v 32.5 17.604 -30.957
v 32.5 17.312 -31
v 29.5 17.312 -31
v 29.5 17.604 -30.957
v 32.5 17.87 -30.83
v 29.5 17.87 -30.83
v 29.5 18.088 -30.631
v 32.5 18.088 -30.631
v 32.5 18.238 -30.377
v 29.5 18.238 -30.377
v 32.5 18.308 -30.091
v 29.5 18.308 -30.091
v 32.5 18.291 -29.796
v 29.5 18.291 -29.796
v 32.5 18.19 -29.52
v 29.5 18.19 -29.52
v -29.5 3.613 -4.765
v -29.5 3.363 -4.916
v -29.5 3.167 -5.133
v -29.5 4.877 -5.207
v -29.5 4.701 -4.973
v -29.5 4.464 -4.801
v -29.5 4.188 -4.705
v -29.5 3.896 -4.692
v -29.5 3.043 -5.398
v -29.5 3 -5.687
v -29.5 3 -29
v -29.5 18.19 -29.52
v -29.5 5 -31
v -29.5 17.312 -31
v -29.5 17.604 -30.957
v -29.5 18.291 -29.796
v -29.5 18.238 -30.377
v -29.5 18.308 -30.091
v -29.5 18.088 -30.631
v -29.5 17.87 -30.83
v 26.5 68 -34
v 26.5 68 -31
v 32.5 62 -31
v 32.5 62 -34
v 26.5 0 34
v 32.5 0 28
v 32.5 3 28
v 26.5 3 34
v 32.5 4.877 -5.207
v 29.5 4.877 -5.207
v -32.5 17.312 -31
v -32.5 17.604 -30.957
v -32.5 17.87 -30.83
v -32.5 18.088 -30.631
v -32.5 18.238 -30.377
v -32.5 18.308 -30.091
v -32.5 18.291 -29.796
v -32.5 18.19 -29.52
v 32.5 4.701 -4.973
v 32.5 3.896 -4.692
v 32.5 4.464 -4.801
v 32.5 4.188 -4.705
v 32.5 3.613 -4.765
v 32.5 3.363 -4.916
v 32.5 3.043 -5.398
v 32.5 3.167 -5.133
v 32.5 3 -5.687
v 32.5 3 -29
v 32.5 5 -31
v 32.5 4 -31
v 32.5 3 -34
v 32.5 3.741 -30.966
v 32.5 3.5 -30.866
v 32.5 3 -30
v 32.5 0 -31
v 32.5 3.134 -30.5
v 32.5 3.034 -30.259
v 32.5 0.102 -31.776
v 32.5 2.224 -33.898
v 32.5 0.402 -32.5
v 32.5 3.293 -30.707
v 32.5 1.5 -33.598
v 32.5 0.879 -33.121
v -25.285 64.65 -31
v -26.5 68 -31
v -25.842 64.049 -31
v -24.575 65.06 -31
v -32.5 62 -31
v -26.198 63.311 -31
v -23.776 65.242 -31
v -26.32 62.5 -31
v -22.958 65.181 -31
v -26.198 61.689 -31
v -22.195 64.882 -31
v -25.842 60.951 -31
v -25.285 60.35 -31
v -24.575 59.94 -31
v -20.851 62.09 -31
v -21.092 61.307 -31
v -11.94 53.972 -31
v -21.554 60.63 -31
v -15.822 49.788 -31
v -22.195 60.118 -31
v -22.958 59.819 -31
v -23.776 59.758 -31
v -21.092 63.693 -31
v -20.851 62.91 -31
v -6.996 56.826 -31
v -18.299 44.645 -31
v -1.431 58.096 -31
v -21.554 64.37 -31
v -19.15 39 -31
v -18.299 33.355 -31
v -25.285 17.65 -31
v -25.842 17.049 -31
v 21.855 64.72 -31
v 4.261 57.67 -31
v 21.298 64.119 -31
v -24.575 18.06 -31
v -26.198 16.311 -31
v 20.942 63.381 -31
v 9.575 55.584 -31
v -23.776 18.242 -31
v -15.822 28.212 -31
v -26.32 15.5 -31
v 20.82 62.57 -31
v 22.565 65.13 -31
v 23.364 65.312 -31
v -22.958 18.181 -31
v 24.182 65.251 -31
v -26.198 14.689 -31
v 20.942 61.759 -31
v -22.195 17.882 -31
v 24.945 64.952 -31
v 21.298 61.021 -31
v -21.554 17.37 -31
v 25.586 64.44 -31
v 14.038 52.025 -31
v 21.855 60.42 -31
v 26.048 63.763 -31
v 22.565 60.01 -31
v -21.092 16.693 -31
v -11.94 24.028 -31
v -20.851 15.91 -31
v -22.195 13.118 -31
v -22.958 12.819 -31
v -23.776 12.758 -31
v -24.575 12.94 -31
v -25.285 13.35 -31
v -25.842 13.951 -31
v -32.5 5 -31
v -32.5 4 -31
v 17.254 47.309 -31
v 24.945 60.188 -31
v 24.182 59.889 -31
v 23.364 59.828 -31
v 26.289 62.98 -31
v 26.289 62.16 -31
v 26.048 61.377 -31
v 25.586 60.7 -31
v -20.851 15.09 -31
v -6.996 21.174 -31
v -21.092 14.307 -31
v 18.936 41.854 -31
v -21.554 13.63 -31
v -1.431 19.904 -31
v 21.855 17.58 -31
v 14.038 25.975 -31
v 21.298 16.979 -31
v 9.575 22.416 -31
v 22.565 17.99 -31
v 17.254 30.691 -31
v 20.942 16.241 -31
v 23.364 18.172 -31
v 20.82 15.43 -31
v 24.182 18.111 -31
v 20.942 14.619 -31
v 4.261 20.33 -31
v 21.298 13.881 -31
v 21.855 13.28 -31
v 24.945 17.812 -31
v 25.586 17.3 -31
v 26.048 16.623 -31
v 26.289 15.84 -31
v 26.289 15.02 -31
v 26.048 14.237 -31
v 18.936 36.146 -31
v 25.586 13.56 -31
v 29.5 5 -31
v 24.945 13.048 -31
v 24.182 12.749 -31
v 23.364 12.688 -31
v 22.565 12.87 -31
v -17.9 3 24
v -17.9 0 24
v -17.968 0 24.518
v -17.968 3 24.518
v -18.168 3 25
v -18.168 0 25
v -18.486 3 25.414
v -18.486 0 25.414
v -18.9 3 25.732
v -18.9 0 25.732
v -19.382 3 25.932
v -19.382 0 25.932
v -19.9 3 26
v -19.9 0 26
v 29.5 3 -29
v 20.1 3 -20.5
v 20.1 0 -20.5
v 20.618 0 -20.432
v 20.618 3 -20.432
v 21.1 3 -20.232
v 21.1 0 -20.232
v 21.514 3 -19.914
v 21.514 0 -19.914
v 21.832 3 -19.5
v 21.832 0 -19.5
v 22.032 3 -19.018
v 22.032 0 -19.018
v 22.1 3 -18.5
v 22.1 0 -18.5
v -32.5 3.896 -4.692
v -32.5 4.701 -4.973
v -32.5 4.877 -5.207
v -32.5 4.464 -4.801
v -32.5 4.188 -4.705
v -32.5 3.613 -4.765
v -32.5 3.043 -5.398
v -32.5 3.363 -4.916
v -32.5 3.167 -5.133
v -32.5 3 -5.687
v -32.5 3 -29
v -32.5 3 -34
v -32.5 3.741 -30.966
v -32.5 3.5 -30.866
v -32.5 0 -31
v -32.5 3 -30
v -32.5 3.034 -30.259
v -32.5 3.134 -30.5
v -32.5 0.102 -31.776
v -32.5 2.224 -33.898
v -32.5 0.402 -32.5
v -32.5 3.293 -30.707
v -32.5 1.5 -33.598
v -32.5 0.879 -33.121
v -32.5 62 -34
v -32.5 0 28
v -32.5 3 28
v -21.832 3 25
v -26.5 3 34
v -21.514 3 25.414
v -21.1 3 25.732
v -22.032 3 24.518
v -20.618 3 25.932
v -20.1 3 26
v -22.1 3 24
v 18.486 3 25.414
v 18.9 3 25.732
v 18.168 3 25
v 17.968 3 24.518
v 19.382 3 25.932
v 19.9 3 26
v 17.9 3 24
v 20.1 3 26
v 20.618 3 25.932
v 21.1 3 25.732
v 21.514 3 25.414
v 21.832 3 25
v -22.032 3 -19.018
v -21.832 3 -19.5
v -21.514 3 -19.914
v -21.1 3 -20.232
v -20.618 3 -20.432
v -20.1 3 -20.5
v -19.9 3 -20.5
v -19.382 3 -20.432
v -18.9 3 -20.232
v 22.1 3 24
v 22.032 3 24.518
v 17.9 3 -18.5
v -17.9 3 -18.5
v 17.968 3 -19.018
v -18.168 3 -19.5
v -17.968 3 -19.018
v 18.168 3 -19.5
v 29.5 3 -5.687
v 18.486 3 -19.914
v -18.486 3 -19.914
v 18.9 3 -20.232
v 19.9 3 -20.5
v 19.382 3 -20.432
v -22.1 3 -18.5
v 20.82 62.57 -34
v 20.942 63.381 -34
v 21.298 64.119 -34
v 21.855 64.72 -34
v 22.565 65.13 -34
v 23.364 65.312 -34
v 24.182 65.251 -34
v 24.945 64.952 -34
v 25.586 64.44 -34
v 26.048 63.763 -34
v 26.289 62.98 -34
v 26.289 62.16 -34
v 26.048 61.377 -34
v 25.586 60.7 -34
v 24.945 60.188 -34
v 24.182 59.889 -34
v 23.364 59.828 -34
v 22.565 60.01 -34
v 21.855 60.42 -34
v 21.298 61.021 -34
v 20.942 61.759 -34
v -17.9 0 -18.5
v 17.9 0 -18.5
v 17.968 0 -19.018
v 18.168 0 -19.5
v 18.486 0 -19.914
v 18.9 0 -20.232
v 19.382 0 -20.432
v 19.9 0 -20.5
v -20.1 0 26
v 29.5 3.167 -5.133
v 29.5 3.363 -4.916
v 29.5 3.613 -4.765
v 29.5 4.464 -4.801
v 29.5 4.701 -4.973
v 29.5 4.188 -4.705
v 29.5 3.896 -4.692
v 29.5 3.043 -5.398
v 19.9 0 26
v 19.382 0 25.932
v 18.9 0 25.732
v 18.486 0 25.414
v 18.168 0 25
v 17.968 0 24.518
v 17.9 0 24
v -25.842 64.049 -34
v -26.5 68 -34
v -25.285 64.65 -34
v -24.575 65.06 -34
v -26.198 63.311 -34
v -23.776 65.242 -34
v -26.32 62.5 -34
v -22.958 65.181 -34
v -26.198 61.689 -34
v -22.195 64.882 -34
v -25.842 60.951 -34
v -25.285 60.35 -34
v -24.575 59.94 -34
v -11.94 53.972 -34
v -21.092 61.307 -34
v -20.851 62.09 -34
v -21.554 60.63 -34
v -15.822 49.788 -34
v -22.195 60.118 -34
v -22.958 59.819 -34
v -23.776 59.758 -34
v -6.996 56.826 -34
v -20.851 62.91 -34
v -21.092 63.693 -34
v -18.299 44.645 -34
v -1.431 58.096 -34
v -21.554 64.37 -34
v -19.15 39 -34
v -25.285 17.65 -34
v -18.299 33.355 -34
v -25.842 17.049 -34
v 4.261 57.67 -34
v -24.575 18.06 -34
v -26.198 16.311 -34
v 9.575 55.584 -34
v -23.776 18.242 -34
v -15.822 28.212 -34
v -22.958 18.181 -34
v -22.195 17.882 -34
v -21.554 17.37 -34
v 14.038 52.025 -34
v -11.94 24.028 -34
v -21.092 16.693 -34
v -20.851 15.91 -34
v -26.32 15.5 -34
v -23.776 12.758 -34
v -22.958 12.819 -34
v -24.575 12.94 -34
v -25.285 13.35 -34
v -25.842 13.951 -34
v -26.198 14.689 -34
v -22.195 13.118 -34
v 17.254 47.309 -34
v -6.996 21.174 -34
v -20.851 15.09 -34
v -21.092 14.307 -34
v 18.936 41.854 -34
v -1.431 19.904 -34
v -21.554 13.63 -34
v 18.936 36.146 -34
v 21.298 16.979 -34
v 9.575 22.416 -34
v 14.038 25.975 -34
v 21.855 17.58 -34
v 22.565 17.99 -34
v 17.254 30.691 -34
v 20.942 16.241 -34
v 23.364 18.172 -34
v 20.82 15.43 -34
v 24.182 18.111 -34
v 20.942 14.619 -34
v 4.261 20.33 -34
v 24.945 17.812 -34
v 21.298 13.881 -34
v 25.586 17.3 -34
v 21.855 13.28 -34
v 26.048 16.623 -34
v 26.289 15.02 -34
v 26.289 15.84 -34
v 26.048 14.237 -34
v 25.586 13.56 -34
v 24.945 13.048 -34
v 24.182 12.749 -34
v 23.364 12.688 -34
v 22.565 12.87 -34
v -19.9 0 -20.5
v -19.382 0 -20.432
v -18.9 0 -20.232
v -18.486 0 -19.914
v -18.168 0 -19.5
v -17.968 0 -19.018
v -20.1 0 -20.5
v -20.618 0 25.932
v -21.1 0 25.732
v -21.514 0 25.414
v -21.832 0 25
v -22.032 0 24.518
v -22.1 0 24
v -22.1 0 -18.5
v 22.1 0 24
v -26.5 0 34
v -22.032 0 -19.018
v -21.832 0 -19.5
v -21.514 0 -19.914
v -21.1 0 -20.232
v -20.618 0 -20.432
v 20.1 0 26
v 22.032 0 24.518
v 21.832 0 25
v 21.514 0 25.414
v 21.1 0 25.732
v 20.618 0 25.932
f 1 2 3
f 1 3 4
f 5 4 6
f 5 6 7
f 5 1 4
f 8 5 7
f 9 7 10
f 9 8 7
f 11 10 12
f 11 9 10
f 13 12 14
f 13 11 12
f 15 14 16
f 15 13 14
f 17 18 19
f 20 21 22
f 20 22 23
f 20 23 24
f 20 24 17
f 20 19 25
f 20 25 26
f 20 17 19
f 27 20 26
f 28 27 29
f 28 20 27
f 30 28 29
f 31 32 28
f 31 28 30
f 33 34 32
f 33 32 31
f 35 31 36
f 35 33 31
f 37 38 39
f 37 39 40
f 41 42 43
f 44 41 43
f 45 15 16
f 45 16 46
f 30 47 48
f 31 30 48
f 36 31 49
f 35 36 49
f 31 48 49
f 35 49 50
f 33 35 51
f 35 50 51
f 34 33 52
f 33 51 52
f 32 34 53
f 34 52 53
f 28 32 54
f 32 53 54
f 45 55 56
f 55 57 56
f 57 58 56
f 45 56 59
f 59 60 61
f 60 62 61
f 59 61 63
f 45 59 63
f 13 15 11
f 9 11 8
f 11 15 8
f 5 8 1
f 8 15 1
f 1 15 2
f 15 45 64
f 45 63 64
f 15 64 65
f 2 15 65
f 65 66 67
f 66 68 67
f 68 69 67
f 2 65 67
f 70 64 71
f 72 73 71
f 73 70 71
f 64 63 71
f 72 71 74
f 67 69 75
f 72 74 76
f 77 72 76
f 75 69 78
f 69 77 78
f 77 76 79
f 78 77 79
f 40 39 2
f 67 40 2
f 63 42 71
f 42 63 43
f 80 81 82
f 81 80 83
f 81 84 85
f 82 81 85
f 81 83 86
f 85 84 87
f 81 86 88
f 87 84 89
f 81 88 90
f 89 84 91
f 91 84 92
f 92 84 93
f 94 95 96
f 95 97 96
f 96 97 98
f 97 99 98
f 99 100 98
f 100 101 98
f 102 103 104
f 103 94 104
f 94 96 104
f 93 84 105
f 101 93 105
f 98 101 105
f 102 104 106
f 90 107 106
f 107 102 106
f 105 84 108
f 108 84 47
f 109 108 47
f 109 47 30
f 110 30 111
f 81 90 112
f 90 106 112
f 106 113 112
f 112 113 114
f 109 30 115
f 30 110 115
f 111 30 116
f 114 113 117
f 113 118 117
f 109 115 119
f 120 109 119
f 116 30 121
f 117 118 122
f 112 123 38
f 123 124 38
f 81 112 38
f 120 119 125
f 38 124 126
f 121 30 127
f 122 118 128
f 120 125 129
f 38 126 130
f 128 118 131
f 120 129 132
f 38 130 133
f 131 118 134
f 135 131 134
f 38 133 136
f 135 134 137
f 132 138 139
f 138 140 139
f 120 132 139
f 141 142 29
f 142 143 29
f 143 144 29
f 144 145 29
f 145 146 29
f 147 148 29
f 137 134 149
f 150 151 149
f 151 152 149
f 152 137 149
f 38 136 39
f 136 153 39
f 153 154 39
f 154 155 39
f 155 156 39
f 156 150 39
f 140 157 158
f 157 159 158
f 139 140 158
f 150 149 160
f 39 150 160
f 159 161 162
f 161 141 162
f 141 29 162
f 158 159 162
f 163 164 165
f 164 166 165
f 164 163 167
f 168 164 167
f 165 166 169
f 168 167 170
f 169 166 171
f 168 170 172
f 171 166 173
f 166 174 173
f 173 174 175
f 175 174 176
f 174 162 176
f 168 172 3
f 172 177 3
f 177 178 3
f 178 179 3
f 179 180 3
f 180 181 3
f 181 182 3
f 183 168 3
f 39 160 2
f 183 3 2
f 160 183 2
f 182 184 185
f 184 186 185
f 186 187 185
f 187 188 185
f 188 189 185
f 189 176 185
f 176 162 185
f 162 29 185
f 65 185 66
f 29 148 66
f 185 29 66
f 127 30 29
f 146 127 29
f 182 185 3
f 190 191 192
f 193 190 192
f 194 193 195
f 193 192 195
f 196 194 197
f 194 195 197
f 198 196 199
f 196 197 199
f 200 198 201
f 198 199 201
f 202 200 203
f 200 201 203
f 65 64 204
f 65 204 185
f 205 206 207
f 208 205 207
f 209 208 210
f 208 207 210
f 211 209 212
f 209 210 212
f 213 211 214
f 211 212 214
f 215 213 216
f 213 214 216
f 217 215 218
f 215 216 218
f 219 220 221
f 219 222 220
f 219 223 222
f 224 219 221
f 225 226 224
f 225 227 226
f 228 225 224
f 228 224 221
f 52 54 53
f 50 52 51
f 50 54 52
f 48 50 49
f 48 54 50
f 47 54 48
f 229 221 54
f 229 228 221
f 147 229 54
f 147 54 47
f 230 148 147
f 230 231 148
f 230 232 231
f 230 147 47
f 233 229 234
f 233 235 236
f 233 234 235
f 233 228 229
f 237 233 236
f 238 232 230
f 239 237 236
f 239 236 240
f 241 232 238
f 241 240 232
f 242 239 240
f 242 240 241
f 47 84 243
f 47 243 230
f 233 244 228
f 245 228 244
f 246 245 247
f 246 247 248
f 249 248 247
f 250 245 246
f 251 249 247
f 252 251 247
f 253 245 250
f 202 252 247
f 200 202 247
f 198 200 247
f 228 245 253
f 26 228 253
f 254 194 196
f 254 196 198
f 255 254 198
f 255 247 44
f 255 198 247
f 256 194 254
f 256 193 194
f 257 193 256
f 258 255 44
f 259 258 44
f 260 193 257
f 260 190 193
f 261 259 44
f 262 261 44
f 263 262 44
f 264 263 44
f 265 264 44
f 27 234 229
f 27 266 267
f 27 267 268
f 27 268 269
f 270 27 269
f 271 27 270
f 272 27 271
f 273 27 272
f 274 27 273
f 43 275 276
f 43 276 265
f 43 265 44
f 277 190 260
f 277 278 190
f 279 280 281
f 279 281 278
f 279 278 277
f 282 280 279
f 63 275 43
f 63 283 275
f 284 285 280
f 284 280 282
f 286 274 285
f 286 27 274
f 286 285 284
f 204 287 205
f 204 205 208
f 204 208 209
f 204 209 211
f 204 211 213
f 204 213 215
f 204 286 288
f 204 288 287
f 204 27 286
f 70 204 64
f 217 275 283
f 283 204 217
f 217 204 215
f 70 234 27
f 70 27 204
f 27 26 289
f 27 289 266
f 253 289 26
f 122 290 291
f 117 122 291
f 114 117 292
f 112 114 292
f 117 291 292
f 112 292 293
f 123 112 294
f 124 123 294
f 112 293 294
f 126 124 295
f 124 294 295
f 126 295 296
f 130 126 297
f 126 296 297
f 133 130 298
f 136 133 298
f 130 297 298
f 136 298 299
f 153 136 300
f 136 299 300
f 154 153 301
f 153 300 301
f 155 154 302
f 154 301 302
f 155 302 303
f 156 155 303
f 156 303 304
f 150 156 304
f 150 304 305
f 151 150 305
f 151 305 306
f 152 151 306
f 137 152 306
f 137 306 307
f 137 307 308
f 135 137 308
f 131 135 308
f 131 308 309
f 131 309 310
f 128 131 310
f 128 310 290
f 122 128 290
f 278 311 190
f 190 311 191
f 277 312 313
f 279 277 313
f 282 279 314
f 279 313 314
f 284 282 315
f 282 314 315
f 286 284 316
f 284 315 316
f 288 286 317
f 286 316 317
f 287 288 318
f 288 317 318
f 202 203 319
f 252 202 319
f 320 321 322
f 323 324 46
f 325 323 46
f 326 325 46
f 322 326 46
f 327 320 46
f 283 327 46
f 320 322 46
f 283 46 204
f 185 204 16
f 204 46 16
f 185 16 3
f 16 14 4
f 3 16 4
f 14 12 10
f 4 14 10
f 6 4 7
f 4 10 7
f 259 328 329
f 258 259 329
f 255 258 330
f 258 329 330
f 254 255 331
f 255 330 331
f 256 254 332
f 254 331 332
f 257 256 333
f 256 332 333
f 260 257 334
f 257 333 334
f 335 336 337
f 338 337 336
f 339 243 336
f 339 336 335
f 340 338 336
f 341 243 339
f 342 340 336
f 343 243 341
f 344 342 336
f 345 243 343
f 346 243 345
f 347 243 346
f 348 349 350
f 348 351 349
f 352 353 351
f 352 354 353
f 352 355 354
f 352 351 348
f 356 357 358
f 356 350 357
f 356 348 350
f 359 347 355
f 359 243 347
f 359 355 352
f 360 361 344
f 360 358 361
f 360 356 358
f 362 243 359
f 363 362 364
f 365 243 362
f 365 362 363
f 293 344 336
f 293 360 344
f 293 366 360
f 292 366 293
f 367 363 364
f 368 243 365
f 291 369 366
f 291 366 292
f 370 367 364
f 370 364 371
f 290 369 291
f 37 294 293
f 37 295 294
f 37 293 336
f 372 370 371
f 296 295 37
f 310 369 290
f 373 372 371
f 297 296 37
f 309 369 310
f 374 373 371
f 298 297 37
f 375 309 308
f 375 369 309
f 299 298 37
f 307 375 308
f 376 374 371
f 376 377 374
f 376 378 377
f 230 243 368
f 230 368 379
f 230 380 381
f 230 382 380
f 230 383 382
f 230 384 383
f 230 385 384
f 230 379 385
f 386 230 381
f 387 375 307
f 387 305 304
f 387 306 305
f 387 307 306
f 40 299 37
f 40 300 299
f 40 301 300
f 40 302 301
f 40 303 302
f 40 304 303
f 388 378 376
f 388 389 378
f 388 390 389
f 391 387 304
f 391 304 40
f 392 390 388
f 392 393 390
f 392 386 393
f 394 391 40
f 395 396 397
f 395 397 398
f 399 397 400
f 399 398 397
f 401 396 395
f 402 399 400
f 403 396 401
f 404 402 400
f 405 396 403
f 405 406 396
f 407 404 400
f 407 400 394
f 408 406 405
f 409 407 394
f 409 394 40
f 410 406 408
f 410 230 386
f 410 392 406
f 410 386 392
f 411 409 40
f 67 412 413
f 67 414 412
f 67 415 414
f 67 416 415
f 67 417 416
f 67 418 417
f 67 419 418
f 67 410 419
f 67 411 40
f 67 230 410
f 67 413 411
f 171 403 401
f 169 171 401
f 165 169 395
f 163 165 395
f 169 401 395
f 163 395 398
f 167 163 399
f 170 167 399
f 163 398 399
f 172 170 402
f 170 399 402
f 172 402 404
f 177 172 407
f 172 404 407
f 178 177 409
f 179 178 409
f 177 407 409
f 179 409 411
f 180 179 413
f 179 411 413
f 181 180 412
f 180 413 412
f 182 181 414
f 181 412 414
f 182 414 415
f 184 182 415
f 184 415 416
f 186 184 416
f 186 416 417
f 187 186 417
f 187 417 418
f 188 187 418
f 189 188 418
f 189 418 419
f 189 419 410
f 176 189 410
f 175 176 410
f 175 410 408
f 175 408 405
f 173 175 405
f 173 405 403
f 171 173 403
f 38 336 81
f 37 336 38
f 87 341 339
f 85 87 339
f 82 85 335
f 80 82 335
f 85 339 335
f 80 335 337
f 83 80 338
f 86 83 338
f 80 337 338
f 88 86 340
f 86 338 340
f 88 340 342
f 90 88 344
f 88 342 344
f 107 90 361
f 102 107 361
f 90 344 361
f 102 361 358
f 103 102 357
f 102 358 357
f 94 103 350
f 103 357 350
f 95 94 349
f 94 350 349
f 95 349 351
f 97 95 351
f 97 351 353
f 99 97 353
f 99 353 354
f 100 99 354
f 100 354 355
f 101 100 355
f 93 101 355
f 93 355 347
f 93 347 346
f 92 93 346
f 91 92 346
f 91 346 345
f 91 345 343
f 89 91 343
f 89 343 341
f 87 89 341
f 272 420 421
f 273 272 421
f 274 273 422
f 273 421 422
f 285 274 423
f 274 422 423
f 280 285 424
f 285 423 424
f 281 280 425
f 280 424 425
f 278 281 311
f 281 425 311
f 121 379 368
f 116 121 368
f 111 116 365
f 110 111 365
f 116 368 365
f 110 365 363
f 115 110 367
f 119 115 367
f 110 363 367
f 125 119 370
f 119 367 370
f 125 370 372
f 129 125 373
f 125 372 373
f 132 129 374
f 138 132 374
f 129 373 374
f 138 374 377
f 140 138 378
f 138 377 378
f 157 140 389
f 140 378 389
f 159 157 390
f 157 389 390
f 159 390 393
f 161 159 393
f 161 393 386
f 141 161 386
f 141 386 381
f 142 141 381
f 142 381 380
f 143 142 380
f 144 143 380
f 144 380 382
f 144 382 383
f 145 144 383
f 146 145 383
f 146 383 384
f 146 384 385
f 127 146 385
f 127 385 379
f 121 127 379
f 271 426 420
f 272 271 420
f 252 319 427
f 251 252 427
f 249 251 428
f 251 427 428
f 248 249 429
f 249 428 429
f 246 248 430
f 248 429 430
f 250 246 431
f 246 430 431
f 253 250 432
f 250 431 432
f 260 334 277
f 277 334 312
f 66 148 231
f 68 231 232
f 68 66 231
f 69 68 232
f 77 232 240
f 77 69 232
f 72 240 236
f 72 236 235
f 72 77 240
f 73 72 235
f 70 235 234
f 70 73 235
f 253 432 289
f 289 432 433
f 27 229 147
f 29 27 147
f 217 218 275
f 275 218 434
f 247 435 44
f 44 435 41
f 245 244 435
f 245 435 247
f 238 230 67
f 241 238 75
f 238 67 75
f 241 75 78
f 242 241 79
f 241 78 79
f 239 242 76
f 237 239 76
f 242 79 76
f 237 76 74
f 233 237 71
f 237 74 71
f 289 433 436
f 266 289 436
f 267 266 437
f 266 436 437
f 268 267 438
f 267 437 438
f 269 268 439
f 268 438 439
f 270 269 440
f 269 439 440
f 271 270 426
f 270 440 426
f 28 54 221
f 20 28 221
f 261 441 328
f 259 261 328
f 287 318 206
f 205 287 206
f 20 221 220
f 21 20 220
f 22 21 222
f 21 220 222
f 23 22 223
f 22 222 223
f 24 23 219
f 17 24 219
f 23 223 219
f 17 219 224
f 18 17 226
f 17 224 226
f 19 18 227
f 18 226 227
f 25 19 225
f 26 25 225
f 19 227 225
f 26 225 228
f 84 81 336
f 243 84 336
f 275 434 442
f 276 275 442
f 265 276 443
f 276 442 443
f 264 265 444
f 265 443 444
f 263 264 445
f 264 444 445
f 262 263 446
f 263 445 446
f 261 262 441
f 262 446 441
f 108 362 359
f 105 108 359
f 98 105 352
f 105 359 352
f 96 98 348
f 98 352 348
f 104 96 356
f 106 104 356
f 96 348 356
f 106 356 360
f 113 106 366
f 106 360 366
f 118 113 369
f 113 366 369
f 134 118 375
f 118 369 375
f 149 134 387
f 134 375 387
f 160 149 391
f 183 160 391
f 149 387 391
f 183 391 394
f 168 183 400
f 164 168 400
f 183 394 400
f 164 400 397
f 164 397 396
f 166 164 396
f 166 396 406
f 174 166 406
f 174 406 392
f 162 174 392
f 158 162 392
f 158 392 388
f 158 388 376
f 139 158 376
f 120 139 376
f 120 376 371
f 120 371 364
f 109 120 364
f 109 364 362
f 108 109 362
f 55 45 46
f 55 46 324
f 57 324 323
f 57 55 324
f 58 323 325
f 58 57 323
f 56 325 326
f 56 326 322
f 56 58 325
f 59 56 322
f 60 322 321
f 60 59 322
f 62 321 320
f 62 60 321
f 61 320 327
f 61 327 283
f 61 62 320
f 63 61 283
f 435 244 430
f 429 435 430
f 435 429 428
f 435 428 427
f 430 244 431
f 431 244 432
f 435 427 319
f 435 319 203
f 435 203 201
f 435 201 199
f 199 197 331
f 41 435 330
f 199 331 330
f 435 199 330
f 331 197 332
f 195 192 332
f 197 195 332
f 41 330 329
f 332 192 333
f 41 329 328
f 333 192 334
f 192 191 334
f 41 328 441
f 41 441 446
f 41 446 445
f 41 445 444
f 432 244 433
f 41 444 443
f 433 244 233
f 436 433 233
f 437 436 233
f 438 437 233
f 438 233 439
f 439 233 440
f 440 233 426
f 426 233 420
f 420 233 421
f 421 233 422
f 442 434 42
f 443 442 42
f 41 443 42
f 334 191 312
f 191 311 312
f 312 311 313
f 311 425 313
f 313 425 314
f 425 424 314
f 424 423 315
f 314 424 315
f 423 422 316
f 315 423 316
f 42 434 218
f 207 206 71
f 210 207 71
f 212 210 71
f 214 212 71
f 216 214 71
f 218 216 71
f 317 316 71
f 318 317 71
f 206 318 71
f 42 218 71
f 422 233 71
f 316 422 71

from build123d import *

# Parameters (mm, degrees)
SKETCH_1_W          = 65
SKETCH_1_H          = 65
EXTRUDE_1_DEPTH     = 3
SKETCH_1_3_W        = 65
SKETCH_1_3_H        = 3
EXTRUDE_2_DEPTH     = 68
CHAMFER_1_SIZE      = 6
CUT_EXTRUDE_1_REACH = 103.51
SKETCH_3_R          = 19.15
SKETCH_3_R_2        = 2.75
FILLET_1_R          = 3
FILLET_2_R          = 1
EXTRUDE_3_DEPTH     = 3
EXTRUDE_START       = -65
EXTRUDE_4_DEPTH     = 3


with BuildPart() as part:
    # Эскиз1 → Бобышка-Вытянуть1 (new body)
    with BuildSketch(Plane(origin=(0, 0, 0), x_dir=(1, 0, 0), z_dir=(0, 1, 0))):
        with Locations((0, -1.5)):
            Rectangle(SKETCH_1_W, SKETCH_1_H)
        with BuildLine():
            Line((-20.1, 20.5), (-19.9, 20.5))
            ThreePointArc((-19.9, 20.5), (-18.485786438, 19.914213562), (-17.9, 18.5))
            Line((-17.9, 18.5), (-17.9, -24))
            ThreePointArc((-17.9, -24), (-18.485786438, -25.414213562), (-19.9, -26))
            Line((-19.9, -26), (-20.1, -26))
            ThreePointArc((-20.1, -26), (-21.514213562, -25.414213562), (-22.1, -24))
            Line((-22.1, -24), (-22.1, 18.5))
            ThreePointArc((-22.1, 18.5), (-21.514213562, 19.914213562), (-20.1, 20.5))
        make_face(mode=Mode.SUBTRACT)
        with BuildLine():
            ThreePointArc((20.1, 20.5), (21.514213562, 19.914213562), (22.1, 18.5))
            Line((22.1, 18.5), (22.1, -24))
            ThreePointArc((22.1, -24), (21.514213562, -25.414213562), (20.1, -26))
            Line((20.1, -26), (19.9, -26))
            ThreePointArc((19.9, -26), (18.485786438, -25.414213562), (17.9, -24))
            Line((17.9, -24), (17.9, 18.5))
            ThreePointArc((17.9, 18.5), (18.485786438, 19.914213562), (19.9, 20.5))
            Line((19.9, 20.5), (20.1, 20.5))
        make_face(mode=Mode.SUBTRACT)
    extrude(amount=EXTRUDE_1_DEPTH)

    # Эскиз1<3> → Бобышка-Вытянуть2 (add)
    with BuildSketch(Plane(origin=(0, 0, 0), x_dir=(1, 0, 0), z_dir=(0, 1, 0))):
        with Locations((0, 32.5)):
            Rectangle(SKETCH_1_3_W, SKETCH_1_3_H)
    extrude(amount=EXTRUDE_2_DEPTH)

    # Фаска1
    chamfer_1_edges = [part.edges().sort_by_distance(p)[0] for p in [
        (32.5, 68, -32.5),
        (-32.5, 68, -32.5),
        (32.5, 1.5, 34),
        (-32.5, 1.5, 34),
    ]]
    chamfer(chamfer_1_edges, length=CHAMFER_1_SIZE)

    # Эскиз3 → Вырез-Вытянуть1 (cut, up to next)
    with BuildSketch(Plane(origin=(0, 0, -34), x_dir=(-1, 0, 0), z_dir=(0, 0, -1)), mode=Mode.PRIVATE) as cut_extrude_1_sk1:
        with Locations((0, 39)):
            Circle(SKETCH_3_R)
    cut_extrude_1_tool1 = extrude(cut_extrude_1_sk1.sketch, amount=-CUT_EXTRUDE_1_REACH, mode=Mode.PRIVATE) & part.part
    # Эскиз3 → Вырез-Вытянуть1 (cut, up to next)
    with BuildSketch(Plane(origin=(0, 0, -34), x_dir=(-1, 0, 0), z_dir=(0, 0, -1)), mode=Mode.PRIVATE) as cut_extrude_1_sk2:
        with Locations((-23.57, 62.57)):
            Circle(SKETCH_3_R_2)
    cut_extrude_1_tool2 = extrude(cut_extrude_1_sk2.sketch, amount=-CUT_EXTRUDE_1_REACH, mode=Mode.PRIVATE) & part.part
    # Эскиз3 → Вырез-Вытянуть1 (cut, up to next)
    with BuildSketch(Plane(origin=(0, 0, -34), x_dir=(-1, 0, 0), z_dir=(0, 0, -1)), mode=Mode.PRIVATE) as cut_extrude_1_sk3:
        with Locations((23.57, 62.5)):
            Circle(SKETCH_3_R_2)
    cut_extrude_1_tool3 = extrude(cut_extrude_1_sk3.sketch, amount=-CUT_EXTRUDE_1_REACH, mode=Mode.PRIVATE) & part.part
    # Эскиз3 → Вырез-Вытянуть1 (cut, up to next)
    with BuildSketch(Plane(origin=(0, 0, -34), x_dir=(-1, 0, 0), z_dir=(0, 0, -1)), mode=Mode.PRIVATE) as cut_extrude_1_sk4:
        with Locations((23.57, 15.5)):
            Circle(SKETCH_3_R_2)
    cut_extrude_1_tool4 = extrude(cut_extrude_1_sk4.sketch, amount=-CUT_EXTRUDE_1_REACH, mode=Mode.PRIVATE) & part.part
    # Эскиз3 → Вырез-Вытянуть1 (cut, up to next)
    with BuildSketch(Plane(origin=(0, 0, -34), x_dir=(-1, 0, 0), z_dir=(0, 0, -1)), mode=Mode.PRIVATE) as cut_extrude_1_sk5:
        with Locations((-23.57, 15.43)):
            Circle(SKETCH_3_R_2)
    cut_extrude_1_tool5 = extrude(cut_extrude_1_sk5.sketch, amount=-CUT_EXTRUDE_1_REACH, mode=Mode.PRIVATE) & part.part
    add(cut_extrude_1_tool1.solids().sort_by_distance((0, 39, -34))[0], mode=Mode.SUBTRACT)
    add(cut_extrude_1_tool2.solids().sort_by_distance((23.57, 62.57, -34))[0], mode=Mode.SUBTRACT)
    add(cut_extrude_1_tool3.solids().sort_by_distance((-23.57, 62.5, -34))[0], mode=Mode.SUBTRACT)
    add(cut_extrude_1_tool4.solids().sort_by_distance((-23.57, 15.5, -34))[0], mode=Mode.SUBTRACT)
    add(cut_extrude_1_tool5.solids().sort_by_distance((23.57, 15.43, -34))[0], mode=Mode.SUBTRACT)

    # Скругление1
    fillet_1_edges = [part.edges().sort_by_distance(p)[0] for p in [
        (0, 0, -34),
    ]]
    fillet(fillet_1_edges, radius=FILLET_1_R)

    # Скругление2
    fillet_2_edges = [part.edges().sort_by_distance(p)[0] for p in [
        (0, 3, -31),
    ]]
    fillet(fillet_2_edges, radius=FILLET_2_R)

    # Эскиз5 → Бобышка-Вытянуть3 (add)
    with BuildSketch(Plane.ZY.offset(32.5)):
        with BuildLine():
            Line((-31, 5), (-31, 17.312374786))
            ThreePointArc((-31, 17.312374786), (-30.509774395, 18.172682908), (-29.519739868, 18.189500891))
            Line((-29.519739868, 18.189500891), (-5.206600655, 4.877126106))
            ThreePointArc((-5.206600655, 4.877126106), (-4.718066148, 3.752135224), (-5.686860788, 3))
            Line((-5.686860788, 3), (-29, 3))
            Line((-29, 3), (-31, 5))
        make_face()
    extrude(amount=-EXTRUDE_3_DEPTH)

    # Эскиз5<2> → Бобышка-Вытянуть4 (add)
    with BuildSketch(Plane.ZY.offset(32.5).offset(EXTRUDE_START)):
        with BuildLine():
            Line((-31, 5), (-31, 17.312374786))
            ThreePointArc((-31, 17.312374786), (-30.509774395, 18.172682908), (-29.519739868, 18.189500891))
            Line((-29.519739868, 18.189500891), (-5.206600655, 4.877126106))
            ThreePointArc((-5.206600655, 4.877126106), (-4.718066148, 3.752135224), (-5.686860788, 3))
            Line((-5.686860788, 3), (-29, 3))
            Line((-29, 3), (-31, 5))
        make_face()
    extrude(amount=EXTRUDE_4_DEPTH)


solid = part.part
